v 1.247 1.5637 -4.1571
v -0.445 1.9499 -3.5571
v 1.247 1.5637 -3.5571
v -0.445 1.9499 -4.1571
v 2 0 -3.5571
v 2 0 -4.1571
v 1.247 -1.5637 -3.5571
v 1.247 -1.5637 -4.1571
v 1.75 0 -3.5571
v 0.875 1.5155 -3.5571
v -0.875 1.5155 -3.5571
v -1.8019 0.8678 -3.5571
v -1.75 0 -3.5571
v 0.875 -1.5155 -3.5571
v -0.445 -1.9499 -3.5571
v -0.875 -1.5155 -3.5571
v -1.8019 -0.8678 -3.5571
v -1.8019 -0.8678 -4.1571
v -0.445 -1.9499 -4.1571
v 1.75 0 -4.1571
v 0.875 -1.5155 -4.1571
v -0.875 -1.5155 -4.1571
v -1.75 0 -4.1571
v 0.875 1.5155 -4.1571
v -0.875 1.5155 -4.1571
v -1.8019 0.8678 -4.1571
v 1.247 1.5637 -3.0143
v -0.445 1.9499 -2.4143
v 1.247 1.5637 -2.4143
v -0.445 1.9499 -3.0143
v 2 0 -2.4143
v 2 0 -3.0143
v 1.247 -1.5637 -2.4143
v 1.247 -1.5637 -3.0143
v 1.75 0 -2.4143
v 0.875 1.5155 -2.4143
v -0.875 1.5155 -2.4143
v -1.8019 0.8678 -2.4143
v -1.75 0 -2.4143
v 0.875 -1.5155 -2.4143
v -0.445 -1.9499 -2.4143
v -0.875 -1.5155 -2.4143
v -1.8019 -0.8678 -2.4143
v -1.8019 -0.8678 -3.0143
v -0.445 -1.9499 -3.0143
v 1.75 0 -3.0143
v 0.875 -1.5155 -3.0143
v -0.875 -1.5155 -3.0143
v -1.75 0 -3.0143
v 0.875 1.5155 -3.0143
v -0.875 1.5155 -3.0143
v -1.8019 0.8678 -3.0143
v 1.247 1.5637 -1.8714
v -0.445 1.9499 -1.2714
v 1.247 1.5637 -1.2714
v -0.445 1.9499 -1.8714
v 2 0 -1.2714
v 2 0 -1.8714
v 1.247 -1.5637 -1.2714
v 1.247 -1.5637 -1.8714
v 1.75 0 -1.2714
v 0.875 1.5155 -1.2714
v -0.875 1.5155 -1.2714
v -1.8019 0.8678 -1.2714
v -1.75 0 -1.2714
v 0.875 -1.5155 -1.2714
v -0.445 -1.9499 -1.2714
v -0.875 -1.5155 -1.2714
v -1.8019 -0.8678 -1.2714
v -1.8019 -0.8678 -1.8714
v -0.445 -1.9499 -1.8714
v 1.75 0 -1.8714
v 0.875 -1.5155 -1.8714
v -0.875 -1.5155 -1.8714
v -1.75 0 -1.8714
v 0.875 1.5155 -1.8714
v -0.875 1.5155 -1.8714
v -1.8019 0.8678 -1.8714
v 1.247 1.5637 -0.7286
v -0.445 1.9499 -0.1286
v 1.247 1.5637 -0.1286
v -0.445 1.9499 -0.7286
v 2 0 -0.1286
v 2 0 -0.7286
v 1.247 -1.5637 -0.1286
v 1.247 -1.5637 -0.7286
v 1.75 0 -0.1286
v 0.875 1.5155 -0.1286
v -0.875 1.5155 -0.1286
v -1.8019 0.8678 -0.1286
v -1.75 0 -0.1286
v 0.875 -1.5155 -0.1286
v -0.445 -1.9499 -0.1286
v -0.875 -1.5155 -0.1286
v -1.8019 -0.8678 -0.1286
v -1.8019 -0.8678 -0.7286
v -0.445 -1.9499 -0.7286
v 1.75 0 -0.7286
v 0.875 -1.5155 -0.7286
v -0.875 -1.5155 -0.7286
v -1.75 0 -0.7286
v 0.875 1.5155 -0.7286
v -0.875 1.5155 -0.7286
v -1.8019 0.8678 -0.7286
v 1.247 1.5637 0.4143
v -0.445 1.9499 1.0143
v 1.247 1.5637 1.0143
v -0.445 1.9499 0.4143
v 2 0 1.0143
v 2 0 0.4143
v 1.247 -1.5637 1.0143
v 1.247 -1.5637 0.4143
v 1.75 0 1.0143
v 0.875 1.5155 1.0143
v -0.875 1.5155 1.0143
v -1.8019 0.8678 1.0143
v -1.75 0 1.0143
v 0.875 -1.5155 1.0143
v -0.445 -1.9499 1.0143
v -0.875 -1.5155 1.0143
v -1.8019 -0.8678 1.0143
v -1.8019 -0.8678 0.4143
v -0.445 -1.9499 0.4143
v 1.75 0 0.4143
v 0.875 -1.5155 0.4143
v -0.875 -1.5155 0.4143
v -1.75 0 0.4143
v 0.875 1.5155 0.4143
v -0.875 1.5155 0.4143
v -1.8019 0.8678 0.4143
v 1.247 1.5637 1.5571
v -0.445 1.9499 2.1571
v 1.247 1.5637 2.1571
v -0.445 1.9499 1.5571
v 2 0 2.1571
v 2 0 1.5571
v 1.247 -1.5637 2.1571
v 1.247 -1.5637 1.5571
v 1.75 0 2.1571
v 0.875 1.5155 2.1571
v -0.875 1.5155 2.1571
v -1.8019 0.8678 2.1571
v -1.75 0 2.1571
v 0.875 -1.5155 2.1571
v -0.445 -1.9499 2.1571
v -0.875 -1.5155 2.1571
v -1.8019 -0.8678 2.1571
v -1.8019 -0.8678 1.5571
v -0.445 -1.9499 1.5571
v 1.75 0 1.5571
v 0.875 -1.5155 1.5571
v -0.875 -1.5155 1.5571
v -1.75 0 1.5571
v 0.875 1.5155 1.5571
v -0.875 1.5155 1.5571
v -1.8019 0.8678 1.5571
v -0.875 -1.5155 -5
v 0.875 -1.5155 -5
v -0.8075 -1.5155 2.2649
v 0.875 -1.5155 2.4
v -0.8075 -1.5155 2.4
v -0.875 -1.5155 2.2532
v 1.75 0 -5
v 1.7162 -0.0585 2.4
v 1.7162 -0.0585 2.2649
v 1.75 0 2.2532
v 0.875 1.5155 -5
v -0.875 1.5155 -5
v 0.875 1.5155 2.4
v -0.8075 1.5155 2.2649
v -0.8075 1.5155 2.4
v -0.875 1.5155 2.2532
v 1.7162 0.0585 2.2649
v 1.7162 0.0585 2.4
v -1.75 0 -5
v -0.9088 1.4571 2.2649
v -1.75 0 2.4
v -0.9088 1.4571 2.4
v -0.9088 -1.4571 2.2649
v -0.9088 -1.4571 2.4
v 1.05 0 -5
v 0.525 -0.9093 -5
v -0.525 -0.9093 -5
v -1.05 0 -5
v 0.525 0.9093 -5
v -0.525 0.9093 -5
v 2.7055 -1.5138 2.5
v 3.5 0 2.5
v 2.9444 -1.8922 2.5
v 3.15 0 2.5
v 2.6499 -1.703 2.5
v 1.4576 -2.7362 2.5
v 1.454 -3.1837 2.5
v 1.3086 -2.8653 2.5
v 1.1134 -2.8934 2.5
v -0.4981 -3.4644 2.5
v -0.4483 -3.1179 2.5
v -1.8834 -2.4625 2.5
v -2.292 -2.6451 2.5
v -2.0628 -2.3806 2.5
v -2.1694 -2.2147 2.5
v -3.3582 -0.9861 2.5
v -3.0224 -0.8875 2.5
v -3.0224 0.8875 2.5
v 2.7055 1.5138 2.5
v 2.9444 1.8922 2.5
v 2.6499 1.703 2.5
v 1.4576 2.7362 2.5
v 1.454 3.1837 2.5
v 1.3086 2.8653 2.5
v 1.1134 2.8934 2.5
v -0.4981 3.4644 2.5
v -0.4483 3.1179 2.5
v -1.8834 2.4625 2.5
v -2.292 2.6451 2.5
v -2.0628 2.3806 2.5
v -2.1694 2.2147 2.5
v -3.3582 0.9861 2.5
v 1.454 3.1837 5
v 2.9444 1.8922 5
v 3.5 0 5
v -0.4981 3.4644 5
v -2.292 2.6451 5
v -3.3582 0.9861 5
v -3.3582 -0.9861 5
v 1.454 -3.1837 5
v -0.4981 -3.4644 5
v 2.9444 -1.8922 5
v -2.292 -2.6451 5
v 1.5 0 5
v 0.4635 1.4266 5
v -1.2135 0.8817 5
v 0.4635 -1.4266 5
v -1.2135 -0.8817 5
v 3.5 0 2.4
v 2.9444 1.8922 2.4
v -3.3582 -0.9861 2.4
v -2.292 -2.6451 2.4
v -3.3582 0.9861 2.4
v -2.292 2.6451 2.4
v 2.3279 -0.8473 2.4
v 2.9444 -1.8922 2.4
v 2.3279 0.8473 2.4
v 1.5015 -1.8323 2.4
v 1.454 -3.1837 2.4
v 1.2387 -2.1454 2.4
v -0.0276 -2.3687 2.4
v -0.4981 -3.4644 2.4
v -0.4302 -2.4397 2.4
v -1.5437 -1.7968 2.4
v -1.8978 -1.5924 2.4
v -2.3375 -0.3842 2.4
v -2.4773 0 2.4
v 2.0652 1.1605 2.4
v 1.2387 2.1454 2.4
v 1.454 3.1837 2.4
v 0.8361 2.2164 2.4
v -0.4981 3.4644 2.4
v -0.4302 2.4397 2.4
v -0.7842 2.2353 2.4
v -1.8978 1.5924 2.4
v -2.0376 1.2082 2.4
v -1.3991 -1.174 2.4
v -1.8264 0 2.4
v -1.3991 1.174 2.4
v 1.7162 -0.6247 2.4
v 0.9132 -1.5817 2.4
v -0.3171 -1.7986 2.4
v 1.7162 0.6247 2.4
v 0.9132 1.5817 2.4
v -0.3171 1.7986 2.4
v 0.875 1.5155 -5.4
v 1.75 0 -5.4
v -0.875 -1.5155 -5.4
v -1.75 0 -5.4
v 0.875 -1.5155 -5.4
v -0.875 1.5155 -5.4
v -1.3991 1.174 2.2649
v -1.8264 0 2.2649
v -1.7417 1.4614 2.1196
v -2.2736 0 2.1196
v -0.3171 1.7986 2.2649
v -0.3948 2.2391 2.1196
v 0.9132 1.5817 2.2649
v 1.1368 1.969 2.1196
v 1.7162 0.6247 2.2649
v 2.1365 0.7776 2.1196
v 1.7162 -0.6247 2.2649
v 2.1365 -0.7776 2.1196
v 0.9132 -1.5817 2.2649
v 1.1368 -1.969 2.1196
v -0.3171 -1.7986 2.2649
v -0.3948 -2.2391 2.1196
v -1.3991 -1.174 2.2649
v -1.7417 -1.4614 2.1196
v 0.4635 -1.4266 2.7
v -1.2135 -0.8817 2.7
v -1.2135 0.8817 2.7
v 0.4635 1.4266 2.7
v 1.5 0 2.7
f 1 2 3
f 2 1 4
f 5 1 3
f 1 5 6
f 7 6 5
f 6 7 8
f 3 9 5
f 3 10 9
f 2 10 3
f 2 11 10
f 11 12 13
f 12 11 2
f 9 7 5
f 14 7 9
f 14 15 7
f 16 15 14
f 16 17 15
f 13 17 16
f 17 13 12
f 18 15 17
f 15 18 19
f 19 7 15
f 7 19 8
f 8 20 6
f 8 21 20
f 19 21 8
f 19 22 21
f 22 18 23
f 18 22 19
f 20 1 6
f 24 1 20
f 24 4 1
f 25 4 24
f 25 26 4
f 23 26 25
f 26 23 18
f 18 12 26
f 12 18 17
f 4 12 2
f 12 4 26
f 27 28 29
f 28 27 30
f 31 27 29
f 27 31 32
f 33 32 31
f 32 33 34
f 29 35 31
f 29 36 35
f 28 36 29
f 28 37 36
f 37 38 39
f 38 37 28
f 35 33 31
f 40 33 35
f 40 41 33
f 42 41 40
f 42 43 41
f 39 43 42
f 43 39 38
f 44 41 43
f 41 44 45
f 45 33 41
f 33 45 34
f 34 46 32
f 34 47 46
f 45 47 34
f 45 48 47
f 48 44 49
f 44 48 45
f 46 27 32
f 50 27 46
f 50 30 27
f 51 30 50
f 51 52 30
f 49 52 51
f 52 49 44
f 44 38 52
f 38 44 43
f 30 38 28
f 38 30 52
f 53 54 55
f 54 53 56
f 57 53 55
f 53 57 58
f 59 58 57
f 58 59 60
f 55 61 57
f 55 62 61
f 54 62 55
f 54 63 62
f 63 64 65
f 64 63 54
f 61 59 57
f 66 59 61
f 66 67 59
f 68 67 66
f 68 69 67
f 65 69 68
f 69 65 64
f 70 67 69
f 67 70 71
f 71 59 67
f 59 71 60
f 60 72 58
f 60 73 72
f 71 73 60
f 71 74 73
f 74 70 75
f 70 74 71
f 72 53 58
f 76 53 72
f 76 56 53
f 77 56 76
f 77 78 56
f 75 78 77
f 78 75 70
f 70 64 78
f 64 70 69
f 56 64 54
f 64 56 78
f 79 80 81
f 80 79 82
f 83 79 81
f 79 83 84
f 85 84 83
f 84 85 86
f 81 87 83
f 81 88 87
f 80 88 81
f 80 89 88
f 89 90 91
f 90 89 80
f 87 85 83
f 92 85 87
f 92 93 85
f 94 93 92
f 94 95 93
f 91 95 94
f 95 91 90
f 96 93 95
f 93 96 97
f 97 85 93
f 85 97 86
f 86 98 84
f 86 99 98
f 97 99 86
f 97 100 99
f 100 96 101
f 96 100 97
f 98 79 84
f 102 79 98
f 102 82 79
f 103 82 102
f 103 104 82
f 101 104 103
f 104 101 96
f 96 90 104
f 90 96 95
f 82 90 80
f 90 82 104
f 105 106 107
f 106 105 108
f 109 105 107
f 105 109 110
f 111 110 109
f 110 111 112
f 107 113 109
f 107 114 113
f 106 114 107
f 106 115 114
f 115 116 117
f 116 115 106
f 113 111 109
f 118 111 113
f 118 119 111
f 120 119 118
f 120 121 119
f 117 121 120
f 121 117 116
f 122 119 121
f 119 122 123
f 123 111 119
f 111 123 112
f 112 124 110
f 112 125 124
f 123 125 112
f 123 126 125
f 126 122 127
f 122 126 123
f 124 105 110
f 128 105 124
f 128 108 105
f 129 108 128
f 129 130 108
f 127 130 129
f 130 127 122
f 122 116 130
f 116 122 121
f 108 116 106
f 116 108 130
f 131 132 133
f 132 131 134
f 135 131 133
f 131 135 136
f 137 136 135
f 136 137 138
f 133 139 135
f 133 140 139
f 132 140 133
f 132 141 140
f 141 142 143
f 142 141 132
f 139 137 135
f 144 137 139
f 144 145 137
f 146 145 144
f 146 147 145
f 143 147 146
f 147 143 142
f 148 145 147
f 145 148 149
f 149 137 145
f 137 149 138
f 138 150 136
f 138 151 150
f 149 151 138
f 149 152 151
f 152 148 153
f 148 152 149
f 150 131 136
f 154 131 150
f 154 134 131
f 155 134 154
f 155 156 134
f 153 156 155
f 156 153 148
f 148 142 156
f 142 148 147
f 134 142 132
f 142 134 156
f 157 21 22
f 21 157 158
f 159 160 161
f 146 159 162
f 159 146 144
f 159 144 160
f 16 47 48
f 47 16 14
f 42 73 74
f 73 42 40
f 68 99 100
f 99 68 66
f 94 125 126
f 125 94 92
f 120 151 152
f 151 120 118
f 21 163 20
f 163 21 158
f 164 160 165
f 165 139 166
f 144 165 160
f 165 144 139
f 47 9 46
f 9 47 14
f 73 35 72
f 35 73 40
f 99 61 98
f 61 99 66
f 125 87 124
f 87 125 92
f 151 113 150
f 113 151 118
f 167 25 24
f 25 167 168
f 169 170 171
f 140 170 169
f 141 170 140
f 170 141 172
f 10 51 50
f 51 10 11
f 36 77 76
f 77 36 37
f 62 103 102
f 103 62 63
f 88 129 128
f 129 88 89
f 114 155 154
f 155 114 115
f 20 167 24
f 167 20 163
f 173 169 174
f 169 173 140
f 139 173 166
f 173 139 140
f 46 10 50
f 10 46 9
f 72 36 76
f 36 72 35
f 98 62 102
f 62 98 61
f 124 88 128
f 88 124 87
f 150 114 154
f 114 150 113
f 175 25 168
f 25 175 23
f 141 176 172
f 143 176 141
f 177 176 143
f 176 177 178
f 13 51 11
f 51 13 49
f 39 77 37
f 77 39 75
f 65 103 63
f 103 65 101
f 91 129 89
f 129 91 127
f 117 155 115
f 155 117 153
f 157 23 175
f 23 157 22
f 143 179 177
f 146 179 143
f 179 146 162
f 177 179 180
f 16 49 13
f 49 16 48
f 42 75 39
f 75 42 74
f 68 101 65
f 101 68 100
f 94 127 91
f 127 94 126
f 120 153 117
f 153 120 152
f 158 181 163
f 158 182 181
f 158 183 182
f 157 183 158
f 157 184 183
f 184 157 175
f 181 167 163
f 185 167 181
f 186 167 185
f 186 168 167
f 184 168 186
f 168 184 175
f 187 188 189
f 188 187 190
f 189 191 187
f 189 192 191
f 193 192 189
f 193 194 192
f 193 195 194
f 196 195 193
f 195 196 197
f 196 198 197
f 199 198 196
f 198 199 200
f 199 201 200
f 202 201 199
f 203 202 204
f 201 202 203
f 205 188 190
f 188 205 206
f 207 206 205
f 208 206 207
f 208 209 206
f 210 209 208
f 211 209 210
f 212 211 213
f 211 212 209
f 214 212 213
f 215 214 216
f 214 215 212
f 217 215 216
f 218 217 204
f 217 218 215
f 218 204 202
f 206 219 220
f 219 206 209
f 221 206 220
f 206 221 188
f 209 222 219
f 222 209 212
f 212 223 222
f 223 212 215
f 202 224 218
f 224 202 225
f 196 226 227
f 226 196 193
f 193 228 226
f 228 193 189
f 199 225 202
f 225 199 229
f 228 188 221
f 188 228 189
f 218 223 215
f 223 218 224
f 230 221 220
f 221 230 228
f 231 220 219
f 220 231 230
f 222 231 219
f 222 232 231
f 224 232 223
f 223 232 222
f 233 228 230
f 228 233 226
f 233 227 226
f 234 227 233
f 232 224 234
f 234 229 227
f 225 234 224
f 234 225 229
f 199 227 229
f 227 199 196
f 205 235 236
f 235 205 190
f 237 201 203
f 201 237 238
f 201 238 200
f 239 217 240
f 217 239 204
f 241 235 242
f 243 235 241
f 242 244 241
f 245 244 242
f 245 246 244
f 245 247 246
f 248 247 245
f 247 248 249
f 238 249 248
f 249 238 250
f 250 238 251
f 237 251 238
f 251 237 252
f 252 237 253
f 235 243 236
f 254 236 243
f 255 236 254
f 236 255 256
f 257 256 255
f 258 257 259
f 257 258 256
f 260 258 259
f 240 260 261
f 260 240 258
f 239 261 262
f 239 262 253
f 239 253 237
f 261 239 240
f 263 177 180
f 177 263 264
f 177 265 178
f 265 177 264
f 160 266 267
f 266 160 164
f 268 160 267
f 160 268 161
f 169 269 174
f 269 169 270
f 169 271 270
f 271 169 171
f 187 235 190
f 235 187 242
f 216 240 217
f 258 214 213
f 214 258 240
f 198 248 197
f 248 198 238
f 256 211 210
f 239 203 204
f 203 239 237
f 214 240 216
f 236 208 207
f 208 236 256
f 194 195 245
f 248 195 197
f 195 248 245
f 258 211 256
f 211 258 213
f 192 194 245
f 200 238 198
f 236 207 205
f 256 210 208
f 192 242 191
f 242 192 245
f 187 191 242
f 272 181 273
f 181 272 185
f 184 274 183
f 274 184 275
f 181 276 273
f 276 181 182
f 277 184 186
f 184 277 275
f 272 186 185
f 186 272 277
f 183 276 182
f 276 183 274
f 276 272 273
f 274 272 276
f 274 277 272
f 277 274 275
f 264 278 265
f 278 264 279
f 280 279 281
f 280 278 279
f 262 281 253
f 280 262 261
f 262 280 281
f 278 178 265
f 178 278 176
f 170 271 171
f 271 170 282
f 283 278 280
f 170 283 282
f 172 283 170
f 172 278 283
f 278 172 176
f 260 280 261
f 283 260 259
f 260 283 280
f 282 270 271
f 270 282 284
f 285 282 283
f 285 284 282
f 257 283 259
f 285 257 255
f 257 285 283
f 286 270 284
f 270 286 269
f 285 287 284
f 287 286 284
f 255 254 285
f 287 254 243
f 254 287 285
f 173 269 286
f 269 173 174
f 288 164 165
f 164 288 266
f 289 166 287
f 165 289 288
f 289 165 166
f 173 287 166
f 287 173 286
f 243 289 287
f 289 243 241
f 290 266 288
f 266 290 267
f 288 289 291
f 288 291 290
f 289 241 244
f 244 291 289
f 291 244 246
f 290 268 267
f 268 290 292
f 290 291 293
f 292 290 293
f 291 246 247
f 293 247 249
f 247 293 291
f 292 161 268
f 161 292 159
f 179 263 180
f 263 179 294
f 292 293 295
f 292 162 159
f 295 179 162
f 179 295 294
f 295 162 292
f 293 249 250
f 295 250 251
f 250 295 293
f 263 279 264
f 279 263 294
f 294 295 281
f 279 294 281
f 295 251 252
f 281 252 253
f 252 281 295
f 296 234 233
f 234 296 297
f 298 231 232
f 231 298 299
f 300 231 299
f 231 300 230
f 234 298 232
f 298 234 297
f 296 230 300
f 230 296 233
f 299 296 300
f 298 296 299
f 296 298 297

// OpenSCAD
// Parameters
screw_length = 10.0; //[5.0:20.0:0.5]
shank_diameter = 3.5; //[1.75:7.0:0.1]
head_diameter = 7.0; //[3.5:14.0:0.1]
head_height = 2.5; //[1.25:5.0:0.1]
thread_length = 8.0; //[4.0:16.0:0.5]
transition_height = 0.5; //[0.25:1.0:0.05]
overlap = 0.8; //[0.5:2.0:0.1]
drive_recess_diameter = 3.0; //[1.5:5.5:0.1]
drive_recess_depth = 1.5; //[0.5:2.4:0.1]
tip_chamfer_height = 1.0; //[0.5:2.0:0.1]
thread_detail_ridge_height = 0.25; //[0.1:0.6:0.05]
thread_detail_ridge_count = 6.0; //[2.0:16.0:1.0]
thread_detail_ridge_thickness = 0.6; //[0.3:1.2:0.1]
fillet_radius = 0.4; //[0.2:1.0:0.05]

// Base shapes
module head() {
  translate([0, 0, screw_length/2 - head_height/2])
    cylinder(h=head_height, r=head_diameter/2, center=true);
}

module shank() {
  translate([0, 0, -screw_length/2 + (screw_length - head_height)/2])
    cylinder(h=screw_length - head_height, r=shank_diameter/2, center=true);
}

module thread_representation() {
  translate([0, 0, -screw_length/2 + thread_length/2])
    cylinder(h=thread_length, r=shank_diameter/2, center=true);
}

module head_to_shank_transition() {
  translate([0, 0, screw_length/2 - head_height - transition_height/2 + overlap/2])
    cylinder(h=transition_height, r1=head_diameter/2, r2=shank_diameter/2, center=true);
}

module tip_chamfer() {
  translate([0, 0, -screw_length/2 + tip_chamfer_height/2 - overlap/2])
    cylinder(h=tip_chamfer_height, r1=shank_diameter/2, r2=0, center=true);
}

module drive_recess() {
  translate([0, 0, screw_length/2 - (drive_recess_depth + overlap)/2])
    cylinder(h=drive_recess_depth + overlap, r=drive_recess_diameter/2, center=true);
}

module fillets() {
  translate([0, 0, screw_length/2 - head_height - fillet_radius + overlap/2])
    rotate_extrude() translate([shank_diameter/2 + fillet_radius, 0, 0])
      circle(r=fillet_radius);
}

module thread_detail_ridge(pos) {
  translate([0, 0, -screw_length/2 + (thread_length/(thread_detail_ridge_count+1))*pos])
    cylinder(h=thread_detail_ridge_thickness, r=shank_diameter/2 + thread_detail_ridge_height, center=true);
}

// Thread detail
module thread_detail() {
  union() {
    thread_representation();
    for (i = [1:thread_detail_ridge_count])
      thread_detail_ridge(i);
  }
}

// Screw solid pre-recess
module screw_solid_pre_recess() {
  union() {
    shank();
    head();
    head_to_shank_transition();
    tip_chamfer();
    fillets();
    thread_detail();
  }
}

// Final screw model
difference() {
  screw_solid_pre_recess();
  drive_recess();
}
